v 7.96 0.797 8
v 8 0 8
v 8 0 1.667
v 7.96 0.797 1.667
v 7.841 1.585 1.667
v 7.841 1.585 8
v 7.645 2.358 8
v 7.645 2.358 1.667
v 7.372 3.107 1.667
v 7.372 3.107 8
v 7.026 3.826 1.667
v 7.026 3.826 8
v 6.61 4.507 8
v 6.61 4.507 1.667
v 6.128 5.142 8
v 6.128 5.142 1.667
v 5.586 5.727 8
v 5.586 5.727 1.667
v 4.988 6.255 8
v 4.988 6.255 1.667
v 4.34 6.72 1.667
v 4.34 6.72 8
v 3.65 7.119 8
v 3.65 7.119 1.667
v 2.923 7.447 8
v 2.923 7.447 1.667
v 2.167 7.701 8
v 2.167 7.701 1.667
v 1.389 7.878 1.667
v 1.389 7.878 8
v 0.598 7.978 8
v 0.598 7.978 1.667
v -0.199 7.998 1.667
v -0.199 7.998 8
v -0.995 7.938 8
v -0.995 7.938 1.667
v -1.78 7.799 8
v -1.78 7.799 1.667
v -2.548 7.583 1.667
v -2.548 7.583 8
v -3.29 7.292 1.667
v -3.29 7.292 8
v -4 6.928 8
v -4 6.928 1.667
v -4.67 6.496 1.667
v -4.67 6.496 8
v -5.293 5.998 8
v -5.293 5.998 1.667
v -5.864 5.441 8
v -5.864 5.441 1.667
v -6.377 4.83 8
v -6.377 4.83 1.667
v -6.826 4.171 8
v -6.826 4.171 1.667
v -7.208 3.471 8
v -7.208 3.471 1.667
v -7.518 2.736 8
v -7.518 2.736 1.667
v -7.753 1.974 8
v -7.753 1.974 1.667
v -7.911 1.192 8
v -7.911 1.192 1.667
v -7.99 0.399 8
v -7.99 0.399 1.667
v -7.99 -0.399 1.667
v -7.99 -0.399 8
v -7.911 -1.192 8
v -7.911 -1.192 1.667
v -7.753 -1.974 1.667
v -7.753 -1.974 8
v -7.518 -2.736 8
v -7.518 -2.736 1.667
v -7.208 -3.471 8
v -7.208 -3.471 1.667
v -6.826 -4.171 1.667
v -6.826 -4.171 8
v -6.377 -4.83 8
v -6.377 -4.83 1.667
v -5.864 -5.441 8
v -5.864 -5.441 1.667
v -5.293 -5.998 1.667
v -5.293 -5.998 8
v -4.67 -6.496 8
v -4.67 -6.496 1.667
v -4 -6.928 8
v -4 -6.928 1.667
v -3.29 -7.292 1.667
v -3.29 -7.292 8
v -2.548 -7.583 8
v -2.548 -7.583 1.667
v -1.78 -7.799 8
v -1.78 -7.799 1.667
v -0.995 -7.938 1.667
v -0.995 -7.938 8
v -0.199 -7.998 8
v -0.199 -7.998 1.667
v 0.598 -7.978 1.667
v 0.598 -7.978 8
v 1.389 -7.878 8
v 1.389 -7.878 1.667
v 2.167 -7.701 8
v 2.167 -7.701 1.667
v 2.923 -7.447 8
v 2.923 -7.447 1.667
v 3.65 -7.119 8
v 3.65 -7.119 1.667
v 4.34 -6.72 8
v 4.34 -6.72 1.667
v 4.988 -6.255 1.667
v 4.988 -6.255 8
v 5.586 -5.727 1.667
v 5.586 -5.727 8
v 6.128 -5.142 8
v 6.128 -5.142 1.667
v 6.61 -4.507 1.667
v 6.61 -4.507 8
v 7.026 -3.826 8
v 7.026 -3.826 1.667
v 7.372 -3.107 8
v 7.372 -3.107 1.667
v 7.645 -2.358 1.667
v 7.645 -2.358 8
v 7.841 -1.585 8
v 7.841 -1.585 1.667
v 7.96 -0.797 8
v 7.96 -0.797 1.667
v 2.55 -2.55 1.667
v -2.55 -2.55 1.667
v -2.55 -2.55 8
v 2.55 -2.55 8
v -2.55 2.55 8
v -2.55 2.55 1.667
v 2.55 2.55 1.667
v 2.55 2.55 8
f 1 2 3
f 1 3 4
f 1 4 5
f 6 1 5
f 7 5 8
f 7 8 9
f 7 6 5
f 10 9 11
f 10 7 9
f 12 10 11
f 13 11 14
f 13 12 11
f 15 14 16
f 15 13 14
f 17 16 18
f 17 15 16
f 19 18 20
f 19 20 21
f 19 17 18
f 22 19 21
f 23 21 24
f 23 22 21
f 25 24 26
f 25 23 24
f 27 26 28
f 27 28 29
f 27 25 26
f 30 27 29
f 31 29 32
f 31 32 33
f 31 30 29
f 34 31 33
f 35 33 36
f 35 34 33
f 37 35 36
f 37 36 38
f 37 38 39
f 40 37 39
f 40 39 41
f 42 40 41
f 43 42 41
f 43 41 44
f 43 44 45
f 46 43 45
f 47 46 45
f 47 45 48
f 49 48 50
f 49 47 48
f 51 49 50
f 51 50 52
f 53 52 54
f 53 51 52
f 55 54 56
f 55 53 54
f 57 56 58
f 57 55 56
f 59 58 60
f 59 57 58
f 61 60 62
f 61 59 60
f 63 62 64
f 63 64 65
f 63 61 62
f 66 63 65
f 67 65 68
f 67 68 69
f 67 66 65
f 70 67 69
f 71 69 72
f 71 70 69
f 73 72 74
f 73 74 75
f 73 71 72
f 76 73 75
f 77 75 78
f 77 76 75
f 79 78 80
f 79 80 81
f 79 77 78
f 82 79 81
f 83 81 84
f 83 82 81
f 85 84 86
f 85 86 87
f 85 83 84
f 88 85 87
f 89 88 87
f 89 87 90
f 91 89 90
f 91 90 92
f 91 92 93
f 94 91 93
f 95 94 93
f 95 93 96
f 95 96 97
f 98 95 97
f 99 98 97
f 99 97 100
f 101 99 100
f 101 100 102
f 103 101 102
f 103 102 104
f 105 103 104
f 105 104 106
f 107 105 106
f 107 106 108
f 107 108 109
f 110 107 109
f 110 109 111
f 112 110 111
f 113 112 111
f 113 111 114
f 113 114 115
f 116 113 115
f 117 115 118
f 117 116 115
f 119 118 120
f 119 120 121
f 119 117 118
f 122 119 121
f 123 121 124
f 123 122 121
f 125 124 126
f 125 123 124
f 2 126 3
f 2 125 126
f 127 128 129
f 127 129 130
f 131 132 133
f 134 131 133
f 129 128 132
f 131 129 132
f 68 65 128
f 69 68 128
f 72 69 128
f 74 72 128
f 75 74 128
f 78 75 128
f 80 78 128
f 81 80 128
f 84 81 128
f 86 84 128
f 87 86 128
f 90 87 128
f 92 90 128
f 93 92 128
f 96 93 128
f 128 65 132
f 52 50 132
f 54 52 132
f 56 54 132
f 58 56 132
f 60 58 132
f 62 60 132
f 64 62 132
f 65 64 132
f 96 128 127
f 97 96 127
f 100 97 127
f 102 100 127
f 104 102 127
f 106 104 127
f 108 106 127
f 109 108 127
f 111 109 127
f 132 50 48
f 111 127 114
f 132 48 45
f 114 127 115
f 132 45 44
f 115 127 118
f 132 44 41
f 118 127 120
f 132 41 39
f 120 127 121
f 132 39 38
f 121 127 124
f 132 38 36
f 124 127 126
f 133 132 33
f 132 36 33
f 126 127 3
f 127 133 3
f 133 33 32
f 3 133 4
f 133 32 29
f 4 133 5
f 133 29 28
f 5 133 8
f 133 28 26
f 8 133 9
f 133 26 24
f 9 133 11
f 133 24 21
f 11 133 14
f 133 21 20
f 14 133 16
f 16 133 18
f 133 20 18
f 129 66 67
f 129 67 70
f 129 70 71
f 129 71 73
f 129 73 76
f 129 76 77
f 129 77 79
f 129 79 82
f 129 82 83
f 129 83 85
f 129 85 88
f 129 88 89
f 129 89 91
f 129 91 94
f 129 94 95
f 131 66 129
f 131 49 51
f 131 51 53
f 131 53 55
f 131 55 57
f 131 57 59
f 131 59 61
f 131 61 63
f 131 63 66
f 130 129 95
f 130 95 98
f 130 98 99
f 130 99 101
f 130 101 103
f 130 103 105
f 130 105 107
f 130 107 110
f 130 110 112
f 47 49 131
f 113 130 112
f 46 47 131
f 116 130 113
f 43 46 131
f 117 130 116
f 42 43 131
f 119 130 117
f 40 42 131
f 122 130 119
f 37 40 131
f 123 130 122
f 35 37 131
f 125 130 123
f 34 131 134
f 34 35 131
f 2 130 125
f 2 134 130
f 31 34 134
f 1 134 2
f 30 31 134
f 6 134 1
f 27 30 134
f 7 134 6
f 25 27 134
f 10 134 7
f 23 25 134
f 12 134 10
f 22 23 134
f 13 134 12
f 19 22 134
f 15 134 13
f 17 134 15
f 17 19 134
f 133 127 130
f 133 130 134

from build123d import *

# Parameters (mm, degrees)
BOSS_EXTRUDE1_START = 8
SKETCH1_R           = 8
BOSS_EXTRUDE1_DEPTH = 6.333
SKETCH3_W           = 5.1
SKETCH3_H           = 5.1
CUT_EXTRUDE4_DEPTH  = 9


with BuildPart() as part:
    # Sketch1 → Boss-Extrude1 (new body)
    with BuildSketch(Plane.XY.offset(BOSS_EXTRUDE1_START)):
        Circle(SKETCH1_R)
    extrude(amount=-BOSS_EXTRUDE1_DEPTH)

    # Sketch3 → Cut-Extrude4 (cut, through all)
    with BuildSketch(Plane.XY):
        Rectangle(SKETCH3_W, SKETCH3_H)
    extrude(amount=CUT_EXTRUDE4_DEPTH, mode=Mode.SUBTRACT)


solid = part.part
